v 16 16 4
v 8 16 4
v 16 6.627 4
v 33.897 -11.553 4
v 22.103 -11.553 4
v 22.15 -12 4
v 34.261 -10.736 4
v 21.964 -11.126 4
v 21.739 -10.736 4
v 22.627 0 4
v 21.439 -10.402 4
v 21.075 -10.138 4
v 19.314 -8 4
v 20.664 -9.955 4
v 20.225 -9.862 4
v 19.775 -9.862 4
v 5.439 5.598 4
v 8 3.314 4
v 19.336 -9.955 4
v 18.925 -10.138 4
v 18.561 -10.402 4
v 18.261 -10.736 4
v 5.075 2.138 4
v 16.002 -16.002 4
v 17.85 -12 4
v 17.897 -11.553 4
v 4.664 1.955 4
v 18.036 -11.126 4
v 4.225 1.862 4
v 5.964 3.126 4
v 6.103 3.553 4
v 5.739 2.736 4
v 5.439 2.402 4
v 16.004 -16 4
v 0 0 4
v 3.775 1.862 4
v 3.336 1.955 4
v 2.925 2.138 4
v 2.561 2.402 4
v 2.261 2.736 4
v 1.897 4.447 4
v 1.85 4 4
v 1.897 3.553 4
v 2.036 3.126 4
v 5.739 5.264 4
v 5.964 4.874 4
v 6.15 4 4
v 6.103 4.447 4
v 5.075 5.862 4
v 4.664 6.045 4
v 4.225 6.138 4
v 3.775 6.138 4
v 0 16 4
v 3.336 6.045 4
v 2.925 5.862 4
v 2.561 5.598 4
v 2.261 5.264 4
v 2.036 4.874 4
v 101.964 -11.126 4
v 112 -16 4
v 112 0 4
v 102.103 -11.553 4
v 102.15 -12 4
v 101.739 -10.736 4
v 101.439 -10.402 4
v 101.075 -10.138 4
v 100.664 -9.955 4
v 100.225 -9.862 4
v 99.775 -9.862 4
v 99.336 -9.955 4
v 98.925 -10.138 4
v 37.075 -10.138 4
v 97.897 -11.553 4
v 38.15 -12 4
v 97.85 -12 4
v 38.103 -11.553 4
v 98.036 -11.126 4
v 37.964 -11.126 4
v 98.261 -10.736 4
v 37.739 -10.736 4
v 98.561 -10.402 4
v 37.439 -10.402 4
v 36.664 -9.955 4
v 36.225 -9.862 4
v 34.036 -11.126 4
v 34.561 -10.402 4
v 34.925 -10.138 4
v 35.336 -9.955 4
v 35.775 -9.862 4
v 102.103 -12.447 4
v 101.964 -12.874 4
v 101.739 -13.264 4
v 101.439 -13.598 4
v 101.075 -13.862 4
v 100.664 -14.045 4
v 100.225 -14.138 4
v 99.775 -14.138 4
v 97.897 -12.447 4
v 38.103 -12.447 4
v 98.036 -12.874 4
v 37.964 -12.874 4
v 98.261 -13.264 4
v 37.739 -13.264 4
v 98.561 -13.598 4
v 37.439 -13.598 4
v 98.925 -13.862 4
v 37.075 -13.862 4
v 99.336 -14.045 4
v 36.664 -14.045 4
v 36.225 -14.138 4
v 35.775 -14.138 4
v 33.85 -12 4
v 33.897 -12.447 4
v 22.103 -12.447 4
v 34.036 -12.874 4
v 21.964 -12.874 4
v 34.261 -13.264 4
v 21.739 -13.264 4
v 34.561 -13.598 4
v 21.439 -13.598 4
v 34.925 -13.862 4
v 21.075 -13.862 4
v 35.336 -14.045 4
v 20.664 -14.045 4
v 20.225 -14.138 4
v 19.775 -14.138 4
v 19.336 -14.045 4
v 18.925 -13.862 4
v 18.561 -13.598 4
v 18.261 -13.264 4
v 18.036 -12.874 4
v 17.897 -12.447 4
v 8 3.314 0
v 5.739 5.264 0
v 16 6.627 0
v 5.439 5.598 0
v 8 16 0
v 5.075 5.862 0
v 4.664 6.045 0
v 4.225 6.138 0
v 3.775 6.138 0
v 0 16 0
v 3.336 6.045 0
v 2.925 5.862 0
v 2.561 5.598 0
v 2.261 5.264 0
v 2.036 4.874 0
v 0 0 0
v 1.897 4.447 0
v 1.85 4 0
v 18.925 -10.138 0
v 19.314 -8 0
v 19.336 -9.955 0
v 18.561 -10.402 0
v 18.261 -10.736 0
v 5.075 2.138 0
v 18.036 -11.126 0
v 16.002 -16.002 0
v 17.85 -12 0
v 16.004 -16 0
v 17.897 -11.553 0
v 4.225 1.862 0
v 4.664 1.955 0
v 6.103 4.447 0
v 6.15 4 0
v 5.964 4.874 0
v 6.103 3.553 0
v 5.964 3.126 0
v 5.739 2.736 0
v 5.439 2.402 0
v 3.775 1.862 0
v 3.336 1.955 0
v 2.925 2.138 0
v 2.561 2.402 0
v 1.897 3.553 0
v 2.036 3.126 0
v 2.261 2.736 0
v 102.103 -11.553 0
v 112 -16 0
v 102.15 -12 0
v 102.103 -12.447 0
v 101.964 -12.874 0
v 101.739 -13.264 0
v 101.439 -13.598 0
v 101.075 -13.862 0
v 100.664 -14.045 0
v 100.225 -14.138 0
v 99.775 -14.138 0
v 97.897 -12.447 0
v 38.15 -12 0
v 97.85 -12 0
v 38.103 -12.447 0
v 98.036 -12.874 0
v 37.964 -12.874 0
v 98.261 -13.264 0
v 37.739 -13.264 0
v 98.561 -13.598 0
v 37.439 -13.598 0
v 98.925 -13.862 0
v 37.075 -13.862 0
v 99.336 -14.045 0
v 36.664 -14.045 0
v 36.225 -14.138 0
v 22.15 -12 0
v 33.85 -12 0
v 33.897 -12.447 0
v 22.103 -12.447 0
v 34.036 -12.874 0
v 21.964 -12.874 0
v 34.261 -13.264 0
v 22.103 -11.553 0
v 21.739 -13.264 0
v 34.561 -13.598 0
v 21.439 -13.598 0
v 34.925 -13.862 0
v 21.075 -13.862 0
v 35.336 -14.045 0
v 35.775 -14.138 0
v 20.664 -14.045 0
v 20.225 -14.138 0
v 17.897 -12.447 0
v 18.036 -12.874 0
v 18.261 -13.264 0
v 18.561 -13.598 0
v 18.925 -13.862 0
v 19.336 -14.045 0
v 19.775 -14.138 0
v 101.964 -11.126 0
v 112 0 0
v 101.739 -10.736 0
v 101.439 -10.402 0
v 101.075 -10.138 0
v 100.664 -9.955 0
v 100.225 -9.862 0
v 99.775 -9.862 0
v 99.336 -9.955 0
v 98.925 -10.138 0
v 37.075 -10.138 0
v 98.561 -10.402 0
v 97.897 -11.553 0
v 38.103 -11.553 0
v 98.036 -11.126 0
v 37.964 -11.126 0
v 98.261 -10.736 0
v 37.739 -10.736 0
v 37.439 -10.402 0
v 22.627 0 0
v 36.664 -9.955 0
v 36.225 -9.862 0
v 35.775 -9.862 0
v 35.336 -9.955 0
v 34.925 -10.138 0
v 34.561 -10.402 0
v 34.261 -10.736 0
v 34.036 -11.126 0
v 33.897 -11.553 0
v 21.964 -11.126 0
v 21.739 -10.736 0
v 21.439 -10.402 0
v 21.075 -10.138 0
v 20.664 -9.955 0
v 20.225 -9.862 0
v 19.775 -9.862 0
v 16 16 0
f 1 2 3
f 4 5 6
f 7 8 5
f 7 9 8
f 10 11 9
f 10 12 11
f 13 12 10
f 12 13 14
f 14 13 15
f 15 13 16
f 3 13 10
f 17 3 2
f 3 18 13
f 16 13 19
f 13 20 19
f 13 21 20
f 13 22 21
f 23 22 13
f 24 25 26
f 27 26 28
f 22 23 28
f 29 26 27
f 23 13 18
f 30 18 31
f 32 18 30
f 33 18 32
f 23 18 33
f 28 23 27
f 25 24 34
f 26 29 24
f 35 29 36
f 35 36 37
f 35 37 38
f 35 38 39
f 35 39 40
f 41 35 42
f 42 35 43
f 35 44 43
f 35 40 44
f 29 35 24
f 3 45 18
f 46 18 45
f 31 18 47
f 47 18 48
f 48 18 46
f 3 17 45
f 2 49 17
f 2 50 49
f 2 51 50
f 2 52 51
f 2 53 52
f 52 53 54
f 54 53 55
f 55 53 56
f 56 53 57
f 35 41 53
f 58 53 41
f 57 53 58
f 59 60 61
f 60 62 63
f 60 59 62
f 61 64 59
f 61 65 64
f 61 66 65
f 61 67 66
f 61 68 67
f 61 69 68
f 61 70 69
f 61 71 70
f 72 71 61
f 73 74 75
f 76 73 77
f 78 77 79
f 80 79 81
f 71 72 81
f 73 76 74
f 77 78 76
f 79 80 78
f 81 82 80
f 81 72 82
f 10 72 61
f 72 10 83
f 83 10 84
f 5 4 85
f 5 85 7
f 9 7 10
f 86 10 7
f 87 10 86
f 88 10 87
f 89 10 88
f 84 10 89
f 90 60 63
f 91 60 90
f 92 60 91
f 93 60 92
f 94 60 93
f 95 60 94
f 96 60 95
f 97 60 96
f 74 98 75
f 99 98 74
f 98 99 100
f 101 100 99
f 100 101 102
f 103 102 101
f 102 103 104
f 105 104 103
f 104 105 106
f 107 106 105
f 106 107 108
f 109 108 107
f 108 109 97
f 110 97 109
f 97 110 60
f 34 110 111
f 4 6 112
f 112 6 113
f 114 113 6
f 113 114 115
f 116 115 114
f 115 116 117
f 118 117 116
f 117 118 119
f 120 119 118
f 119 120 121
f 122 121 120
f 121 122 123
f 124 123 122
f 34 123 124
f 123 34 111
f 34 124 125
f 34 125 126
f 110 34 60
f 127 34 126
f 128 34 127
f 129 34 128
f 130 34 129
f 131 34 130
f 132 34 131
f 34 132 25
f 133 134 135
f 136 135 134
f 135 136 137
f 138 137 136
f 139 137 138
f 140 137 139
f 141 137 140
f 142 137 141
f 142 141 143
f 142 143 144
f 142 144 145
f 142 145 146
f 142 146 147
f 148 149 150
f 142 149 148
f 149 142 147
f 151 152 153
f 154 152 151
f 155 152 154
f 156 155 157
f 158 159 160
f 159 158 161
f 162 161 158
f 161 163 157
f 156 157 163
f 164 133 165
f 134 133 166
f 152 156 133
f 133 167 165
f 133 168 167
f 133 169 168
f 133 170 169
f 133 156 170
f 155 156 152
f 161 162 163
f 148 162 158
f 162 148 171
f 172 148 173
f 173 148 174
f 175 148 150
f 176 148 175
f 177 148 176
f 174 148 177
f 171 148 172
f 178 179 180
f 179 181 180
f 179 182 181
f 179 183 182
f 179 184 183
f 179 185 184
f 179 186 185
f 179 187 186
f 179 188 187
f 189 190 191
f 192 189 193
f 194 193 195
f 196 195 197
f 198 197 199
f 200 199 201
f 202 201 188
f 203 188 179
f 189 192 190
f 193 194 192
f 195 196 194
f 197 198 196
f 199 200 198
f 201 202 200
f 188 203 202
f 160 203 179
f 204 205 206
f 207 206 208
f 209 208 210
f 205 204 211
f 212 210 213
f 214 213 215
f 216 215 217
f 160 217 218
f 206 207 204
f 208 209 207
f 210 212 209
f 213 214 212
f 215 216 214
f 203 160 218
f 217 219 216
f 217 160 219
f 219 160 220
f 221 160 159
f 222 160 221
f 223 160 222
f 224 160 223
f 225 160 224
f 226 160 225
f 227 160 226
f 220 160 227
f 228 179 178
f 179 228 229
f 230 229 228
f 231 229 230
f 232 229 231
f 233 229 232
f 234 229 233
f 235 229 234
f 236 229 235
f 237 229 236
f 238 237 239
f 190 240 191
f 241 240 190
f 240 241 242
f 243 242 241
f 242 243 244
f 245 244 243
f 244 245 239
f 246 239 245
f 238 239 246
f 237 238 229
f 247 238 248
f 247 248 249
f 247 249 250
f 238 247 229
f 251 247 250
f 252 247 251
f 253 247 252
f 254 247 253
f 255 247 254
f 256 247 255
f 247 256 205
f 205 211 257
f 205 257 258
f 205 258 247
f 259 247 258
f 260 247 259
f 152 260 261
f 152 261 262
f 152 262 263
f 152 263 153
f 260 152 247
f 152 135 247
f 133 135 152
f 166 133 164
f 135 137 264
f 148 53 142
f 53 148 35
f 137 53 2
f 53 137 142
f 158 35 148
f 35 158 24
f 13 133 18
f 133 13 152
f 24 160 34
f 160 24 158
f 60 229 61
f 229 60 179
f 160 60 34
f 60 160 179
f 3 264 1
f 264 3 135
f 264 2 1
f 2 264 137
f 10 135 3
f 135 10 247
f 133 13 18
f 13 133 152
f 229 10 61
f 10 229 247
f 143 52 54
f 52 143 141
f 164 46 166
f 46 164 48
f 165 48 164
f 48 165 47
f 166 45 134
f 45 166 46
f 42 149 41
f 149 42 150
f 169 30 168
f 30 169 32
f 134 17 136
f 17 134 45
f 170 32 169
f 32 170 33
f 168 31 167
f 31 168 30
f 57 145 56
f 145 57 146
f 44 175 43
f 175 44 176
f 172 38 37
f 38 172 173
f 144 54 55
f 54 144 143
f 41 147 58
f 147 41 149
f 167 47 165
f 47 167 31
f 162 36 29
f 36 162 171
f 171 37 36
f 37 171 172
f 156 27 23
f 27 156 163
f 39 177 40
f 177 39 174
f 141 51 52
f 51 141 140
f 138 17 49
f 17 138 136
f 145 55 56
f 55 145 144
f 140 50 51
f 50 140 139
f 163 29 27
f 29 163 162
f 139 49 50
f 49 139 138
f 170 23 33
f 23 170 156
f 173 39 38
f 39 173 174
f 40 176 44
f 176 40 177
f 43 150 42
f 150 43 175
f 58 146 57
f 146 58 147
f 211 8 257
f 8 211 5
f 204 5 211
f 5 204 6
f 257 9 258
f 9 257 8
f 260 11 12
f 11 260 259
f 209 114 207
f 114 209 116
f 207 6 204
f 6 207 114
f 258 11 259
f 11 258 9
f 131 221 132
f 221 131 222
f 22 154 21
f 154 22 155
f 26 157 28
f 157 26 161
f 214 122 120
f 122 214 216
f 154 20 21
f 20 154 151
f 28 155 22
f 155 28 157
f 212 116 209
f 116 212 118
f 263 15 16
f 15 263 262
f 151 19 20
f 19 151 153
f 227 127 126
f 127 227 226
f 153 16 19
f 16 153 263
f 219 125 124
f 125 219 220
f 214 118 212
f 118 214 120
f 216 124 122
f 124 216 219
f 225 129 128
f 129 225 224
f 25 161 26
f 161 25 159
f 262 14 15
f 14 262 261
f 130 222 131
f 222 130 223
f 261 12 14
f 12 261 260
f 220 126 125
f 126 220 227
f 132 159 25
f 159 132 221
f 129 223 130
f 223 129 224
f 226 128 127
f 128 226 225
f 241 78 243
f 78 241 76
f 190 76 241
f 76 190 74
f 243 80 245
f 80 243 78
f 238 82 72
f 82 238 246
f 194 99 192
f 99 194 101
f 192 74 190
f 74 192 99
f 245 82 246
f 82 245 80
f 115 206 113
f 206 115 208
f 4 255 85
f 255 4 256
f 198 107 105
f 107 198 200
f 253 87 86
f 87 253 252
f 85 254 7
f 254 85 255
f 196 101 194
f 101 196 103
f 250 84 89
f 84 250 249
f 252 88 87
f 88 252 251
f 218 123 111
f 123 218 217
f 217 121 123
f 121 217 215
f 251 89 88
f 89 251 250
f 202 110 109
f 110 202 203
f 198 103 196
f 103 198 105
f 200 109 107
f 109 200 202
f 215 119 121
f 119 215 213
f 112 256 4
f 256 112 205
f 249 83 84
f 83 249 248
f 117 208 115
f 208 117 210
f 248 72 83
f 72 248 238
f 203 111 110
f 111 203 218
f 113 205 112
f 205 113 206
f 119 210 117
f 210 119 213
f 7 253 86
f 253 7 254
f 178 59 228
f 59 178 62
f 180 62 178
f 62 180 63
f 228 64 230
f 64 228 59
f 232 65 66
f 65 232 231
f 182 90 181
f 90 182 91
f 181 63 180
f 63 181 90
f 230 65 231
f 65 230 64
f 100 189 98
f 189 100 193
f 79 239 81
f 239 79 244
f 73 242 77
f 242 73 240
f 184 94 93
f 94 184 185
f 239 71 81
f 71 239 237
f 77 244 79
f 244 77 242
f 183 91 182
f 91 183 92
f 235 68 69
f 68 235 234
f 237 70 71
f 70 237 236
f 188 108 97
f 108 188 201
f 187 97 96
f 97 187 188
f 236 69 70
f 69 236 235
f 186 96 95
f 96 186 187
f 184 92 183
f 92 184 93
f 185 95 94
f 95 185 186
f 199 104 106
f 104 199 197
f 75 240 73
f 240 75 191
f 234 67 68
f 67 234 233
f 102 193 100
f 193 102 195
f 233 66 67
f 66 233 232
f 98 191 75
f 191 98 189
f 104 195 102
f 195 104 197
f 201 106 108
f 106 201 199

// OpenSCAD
difference() {
// Top track guard rail. Height of part is 4mm. Holes r=2.15mm, d=4.3mm.

union() {
    // same dimensions as original track
    cube([8,16,4]);
    
    // 8cos(45)=8sin(45)~=5.6568
    translate([5.6568,5.6568,0])
    rotate([0,0,225])
    cube([8,22.63,4]);
    
    translate([16,-16,0])
    cube([96,8,4]);
    
    // adding guard rails
    // 8tan(22.5)~=3.3137
    translate([8,3.3137,0])
    cube([8,12.686,4]);
    
    translate([8,3.3137,0])
    rotate([0,0,315])
    cube([16,8,4]);
    
    translate([19.3137,-8,0])
    cube([92.6863,8,4]);
    
}
      // Holes are numbered from top to bottom, left to right
    // Hole 1 (compatible with lego board)
    translate([4,4,-2])
    cylinder(r=2.15,44, $fn=30);

    // Hole 3
    translate([20,-12,-2])
    cylinder(r=2.15,45, $fn=30);

    // Hole 5 (compatible with lego board)
    translate([36,-12,-2])
    cylinder(r=2.15,45, $fn=30);
    
    // Hole 7
    translate([100,-12,-2])
    cylinder(r=2.15,44, $fn=30);
}
    
